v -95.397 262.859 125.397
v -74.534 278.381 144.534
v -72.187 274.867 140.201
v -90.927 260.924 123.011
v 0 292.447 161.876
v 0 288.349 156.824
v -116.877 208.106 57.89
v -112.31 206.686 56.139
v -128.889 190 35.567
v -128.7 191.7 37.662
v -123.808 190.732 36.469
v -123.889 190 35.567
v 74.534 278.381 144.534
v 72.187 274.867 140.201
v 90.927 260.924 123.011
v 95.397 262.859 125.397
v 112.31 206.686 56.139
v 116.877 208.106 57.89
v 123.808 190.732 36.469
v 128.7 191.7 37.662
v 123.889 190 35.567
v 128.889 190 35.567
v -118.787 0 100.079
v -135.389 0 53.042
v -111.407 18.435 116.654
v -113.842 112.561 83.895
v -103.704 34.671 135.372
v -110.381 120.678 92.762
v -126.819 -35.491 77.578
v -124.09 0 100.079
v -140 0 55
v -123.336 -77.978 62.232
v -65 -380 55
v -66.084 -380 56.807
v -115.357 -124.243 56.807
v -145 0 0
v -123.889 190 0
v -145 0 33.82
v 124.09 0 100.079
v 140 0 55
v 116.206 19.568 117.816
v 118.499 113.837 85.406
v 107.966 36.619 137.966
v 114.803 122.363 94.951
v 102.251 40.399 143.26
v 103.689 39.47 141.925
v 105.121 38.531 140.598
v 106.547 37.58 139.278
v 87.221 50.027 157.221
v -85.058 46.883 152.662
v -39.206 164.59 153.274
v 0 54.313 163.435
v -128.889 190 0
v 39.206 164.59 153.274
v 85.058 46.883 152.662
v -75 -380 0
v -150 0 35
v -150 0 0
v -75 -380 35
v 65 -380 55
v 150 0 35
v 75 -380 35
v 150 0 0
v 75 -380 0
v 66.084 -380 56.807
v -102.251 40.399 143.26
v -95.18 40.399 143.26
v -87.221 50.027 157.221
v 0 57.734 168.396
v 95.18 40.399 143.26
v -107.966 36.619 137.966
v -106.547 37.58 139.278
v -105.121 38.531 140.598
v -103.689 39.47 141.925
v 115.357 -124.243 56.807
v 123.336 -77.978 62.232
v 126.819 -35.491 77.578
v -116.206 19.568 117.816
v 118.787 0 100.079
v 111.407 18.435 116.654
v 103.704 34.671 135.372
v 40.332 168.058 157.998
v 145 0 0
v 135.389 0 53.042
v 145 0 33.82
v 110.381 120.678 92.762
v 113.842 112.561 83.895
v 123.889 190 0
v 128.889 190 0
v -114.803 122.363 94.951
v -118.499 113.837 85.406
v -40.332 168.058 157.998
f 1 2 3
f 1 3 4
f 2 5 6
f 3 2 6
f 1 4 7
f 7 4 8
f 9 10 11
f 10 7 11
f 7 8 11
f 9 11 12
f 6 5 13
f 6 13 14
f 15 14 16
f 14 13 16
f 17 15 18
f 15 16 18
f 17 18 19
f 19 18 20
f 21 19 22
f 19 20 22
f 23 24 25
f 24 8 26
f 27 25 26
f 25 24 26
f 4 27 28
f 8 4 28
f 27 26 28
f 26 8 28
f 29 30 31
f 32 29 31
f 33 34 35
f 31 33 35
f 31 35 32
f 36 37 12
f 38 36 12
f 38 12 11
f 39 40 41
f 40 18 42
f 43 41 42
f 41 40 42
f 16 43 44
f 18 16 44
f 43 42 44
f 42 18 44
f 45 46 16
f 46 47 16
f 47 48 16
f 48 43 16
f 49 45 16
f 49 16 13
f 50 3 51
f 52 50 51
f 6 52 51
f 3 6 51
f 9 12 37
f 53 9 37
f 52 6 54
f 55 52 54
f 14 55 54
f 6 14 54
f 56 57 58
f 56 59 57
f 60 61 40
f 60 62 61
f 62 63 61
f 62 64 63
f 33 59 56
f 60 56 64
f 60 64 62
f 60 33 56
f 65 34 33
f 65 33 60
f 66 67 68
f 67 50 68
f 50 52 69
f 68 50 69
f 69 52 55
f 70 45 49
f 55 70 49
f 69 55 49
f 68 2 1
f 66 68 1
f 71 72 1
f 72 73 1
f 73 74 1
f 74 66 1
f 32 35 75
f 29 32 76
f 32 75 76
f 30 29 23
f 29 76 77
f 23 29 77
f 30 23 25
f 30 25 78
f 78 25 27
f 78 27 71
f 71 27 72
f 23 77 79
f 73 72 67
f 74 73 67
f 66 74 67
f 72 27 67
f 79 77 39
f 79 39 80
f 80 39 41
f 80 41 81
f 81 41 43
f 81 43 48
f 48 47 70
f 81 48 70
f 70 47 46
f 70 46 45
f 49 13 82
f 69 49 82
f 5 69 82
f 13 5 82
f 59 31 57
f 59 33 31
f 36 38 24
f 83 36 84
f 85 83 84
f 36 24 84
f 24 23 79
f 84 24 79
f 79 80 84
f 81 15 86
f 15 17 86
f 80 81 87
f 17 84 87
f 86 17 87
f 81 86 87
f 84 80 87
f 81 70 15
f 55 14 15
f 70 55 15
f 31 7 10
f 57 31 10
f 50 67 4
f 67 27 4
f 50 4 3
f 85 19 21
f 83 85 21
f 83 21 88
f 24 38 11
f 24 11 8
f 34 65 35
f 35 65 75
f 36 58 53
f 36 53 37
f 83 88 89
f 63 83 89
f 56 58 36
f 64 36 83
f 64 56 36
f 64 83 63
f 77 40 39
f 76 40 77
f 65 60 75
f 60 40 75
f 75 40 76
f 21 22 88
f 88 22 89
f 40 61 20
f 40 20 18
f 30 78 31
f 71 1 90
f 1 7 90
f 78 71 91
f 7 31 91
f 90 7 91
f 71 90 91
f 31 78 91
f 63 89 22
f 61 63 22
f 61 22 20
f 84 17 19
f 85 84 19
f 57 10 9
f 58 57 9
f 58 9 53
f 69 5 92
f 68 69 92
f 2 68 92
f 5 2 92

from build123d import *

# Parameters (mm, degrees)
F6_DEPTH  = 150
F11_DEPTH = 150


# Not quite as in the source:
# - a feature names something its author has since deleted; it is built from what else it names


with BuildPart() as f4:
    # F2 (on Front) → F4 section 0
    with BuildSketch(Plane.XZ):
        Polygon((145, 0), (150, 0), (150, 35), (140, 55), (110, 140), (90, 160), (0, 170), (-90, 160), (-110, 140), (-140, 55), (-150, 35), (-150, 0), (-145, 0), (-145, 33.8196601125), (-135.3886514877, 53.0423571371), (-105.6625113622, 137.2664208259), (-87.704664423, 155.2242677651), (0, 164.9692304788), (87.704664423, 155.2242677651), (105.6625113622, 137.2664208259), (135.3886514877, 53.0423571371), (145, 33.8196601125), align=None)
    # F3 (on offset) → F4 section 1
    with BuildSketch(Plane.XZ.offset(-360)):
        Polygon((105, 0), (110, 0), (110, 40), (100, 60), (90, 120), (70, 140), (0, 160), (-70, 140), (-90, 120), (-100, 60), (-110, 40), (-110, 0), (-105, 0), (-105, 38.8196601125), (-95.191631809, 58.4363964945), (-85.3314510321, 117.5974811561), (-67.3806149527, 135.5483172355), (0, 154.7999215077), (67.3806149527, 135.5483172355), (85.3314510321, 117.5974811561), (95.191631809, 58.4363964945), (105, 38.8196601125), align=None)
    loft()

    # F5 (on Right) → F6 (cut, symmetric)
    with BuildSketch(Plane.YZ):
        Polygon((190, 35.5667099357), (190, 0), (189.9669915438, -2.0382583607), (17.2620066122, -21.4886017568), (427.6157569008, -24.6490443013), (429.8257231712, 105.1867231727), (363.7629151344, 190.5601769686), (299.2246747017, 170.2331602573), align=None)
    extrude(amount=F6_DEPTH, both=True, mode=Mode.SUBTRACT)

    # F8 (on Front) → F9 section 0
    with BuildSketch(Plane.XZ):
        Polygon((-150, 0), (150, 0), (150, 35), (140, 55), (110, 140), (90, 160), (0, 170), (-90, 160), (-110, 140), (-140, 55), (-150, 35), align=None)
    # F7 (on offset) → F9 section 1
    with BuildSketch(Plane.XZ.offset(380)):
        Polygon((-75, 0), (75, 0), (75, 35), (65, 55), (110, 130), (90, 150), (0, 160), (-90, 150), (-110, 130), (-65, 55), (-75, 35), align=None)
    loft()

    # F10 (on Right) → F11 (cut, symmetric)
    with BuildSketch(Plane.YZ):
        with BuildLine():
            Line((-388.3555531502, 56.8068251014), (-124.2432887277, 56.8068251014))
            ThreePointArc((-124.2432887277, 56.8068251014), (-31.2629634759, 79.7343565579), (40.3992684554, 143.2602339406))
            Line((40.3992684554, 143.2602339406), (80.7762278766, 201.8068251014))
            Line((80.7762278766, 201.8068251014), (45.3817601157, 256.7874745919))
            Line((45.3817601157, 256.7874745919), (-388.3555531502, 199.957123117))
            Line((-388.3555531502, 199.957123117), (-388.3555531502, 56.8068251014))
        make_face()
    extrude(amount=F11_DEPTH, both=True, mode=Mode.SUBTRACT)


solid = f4.part
